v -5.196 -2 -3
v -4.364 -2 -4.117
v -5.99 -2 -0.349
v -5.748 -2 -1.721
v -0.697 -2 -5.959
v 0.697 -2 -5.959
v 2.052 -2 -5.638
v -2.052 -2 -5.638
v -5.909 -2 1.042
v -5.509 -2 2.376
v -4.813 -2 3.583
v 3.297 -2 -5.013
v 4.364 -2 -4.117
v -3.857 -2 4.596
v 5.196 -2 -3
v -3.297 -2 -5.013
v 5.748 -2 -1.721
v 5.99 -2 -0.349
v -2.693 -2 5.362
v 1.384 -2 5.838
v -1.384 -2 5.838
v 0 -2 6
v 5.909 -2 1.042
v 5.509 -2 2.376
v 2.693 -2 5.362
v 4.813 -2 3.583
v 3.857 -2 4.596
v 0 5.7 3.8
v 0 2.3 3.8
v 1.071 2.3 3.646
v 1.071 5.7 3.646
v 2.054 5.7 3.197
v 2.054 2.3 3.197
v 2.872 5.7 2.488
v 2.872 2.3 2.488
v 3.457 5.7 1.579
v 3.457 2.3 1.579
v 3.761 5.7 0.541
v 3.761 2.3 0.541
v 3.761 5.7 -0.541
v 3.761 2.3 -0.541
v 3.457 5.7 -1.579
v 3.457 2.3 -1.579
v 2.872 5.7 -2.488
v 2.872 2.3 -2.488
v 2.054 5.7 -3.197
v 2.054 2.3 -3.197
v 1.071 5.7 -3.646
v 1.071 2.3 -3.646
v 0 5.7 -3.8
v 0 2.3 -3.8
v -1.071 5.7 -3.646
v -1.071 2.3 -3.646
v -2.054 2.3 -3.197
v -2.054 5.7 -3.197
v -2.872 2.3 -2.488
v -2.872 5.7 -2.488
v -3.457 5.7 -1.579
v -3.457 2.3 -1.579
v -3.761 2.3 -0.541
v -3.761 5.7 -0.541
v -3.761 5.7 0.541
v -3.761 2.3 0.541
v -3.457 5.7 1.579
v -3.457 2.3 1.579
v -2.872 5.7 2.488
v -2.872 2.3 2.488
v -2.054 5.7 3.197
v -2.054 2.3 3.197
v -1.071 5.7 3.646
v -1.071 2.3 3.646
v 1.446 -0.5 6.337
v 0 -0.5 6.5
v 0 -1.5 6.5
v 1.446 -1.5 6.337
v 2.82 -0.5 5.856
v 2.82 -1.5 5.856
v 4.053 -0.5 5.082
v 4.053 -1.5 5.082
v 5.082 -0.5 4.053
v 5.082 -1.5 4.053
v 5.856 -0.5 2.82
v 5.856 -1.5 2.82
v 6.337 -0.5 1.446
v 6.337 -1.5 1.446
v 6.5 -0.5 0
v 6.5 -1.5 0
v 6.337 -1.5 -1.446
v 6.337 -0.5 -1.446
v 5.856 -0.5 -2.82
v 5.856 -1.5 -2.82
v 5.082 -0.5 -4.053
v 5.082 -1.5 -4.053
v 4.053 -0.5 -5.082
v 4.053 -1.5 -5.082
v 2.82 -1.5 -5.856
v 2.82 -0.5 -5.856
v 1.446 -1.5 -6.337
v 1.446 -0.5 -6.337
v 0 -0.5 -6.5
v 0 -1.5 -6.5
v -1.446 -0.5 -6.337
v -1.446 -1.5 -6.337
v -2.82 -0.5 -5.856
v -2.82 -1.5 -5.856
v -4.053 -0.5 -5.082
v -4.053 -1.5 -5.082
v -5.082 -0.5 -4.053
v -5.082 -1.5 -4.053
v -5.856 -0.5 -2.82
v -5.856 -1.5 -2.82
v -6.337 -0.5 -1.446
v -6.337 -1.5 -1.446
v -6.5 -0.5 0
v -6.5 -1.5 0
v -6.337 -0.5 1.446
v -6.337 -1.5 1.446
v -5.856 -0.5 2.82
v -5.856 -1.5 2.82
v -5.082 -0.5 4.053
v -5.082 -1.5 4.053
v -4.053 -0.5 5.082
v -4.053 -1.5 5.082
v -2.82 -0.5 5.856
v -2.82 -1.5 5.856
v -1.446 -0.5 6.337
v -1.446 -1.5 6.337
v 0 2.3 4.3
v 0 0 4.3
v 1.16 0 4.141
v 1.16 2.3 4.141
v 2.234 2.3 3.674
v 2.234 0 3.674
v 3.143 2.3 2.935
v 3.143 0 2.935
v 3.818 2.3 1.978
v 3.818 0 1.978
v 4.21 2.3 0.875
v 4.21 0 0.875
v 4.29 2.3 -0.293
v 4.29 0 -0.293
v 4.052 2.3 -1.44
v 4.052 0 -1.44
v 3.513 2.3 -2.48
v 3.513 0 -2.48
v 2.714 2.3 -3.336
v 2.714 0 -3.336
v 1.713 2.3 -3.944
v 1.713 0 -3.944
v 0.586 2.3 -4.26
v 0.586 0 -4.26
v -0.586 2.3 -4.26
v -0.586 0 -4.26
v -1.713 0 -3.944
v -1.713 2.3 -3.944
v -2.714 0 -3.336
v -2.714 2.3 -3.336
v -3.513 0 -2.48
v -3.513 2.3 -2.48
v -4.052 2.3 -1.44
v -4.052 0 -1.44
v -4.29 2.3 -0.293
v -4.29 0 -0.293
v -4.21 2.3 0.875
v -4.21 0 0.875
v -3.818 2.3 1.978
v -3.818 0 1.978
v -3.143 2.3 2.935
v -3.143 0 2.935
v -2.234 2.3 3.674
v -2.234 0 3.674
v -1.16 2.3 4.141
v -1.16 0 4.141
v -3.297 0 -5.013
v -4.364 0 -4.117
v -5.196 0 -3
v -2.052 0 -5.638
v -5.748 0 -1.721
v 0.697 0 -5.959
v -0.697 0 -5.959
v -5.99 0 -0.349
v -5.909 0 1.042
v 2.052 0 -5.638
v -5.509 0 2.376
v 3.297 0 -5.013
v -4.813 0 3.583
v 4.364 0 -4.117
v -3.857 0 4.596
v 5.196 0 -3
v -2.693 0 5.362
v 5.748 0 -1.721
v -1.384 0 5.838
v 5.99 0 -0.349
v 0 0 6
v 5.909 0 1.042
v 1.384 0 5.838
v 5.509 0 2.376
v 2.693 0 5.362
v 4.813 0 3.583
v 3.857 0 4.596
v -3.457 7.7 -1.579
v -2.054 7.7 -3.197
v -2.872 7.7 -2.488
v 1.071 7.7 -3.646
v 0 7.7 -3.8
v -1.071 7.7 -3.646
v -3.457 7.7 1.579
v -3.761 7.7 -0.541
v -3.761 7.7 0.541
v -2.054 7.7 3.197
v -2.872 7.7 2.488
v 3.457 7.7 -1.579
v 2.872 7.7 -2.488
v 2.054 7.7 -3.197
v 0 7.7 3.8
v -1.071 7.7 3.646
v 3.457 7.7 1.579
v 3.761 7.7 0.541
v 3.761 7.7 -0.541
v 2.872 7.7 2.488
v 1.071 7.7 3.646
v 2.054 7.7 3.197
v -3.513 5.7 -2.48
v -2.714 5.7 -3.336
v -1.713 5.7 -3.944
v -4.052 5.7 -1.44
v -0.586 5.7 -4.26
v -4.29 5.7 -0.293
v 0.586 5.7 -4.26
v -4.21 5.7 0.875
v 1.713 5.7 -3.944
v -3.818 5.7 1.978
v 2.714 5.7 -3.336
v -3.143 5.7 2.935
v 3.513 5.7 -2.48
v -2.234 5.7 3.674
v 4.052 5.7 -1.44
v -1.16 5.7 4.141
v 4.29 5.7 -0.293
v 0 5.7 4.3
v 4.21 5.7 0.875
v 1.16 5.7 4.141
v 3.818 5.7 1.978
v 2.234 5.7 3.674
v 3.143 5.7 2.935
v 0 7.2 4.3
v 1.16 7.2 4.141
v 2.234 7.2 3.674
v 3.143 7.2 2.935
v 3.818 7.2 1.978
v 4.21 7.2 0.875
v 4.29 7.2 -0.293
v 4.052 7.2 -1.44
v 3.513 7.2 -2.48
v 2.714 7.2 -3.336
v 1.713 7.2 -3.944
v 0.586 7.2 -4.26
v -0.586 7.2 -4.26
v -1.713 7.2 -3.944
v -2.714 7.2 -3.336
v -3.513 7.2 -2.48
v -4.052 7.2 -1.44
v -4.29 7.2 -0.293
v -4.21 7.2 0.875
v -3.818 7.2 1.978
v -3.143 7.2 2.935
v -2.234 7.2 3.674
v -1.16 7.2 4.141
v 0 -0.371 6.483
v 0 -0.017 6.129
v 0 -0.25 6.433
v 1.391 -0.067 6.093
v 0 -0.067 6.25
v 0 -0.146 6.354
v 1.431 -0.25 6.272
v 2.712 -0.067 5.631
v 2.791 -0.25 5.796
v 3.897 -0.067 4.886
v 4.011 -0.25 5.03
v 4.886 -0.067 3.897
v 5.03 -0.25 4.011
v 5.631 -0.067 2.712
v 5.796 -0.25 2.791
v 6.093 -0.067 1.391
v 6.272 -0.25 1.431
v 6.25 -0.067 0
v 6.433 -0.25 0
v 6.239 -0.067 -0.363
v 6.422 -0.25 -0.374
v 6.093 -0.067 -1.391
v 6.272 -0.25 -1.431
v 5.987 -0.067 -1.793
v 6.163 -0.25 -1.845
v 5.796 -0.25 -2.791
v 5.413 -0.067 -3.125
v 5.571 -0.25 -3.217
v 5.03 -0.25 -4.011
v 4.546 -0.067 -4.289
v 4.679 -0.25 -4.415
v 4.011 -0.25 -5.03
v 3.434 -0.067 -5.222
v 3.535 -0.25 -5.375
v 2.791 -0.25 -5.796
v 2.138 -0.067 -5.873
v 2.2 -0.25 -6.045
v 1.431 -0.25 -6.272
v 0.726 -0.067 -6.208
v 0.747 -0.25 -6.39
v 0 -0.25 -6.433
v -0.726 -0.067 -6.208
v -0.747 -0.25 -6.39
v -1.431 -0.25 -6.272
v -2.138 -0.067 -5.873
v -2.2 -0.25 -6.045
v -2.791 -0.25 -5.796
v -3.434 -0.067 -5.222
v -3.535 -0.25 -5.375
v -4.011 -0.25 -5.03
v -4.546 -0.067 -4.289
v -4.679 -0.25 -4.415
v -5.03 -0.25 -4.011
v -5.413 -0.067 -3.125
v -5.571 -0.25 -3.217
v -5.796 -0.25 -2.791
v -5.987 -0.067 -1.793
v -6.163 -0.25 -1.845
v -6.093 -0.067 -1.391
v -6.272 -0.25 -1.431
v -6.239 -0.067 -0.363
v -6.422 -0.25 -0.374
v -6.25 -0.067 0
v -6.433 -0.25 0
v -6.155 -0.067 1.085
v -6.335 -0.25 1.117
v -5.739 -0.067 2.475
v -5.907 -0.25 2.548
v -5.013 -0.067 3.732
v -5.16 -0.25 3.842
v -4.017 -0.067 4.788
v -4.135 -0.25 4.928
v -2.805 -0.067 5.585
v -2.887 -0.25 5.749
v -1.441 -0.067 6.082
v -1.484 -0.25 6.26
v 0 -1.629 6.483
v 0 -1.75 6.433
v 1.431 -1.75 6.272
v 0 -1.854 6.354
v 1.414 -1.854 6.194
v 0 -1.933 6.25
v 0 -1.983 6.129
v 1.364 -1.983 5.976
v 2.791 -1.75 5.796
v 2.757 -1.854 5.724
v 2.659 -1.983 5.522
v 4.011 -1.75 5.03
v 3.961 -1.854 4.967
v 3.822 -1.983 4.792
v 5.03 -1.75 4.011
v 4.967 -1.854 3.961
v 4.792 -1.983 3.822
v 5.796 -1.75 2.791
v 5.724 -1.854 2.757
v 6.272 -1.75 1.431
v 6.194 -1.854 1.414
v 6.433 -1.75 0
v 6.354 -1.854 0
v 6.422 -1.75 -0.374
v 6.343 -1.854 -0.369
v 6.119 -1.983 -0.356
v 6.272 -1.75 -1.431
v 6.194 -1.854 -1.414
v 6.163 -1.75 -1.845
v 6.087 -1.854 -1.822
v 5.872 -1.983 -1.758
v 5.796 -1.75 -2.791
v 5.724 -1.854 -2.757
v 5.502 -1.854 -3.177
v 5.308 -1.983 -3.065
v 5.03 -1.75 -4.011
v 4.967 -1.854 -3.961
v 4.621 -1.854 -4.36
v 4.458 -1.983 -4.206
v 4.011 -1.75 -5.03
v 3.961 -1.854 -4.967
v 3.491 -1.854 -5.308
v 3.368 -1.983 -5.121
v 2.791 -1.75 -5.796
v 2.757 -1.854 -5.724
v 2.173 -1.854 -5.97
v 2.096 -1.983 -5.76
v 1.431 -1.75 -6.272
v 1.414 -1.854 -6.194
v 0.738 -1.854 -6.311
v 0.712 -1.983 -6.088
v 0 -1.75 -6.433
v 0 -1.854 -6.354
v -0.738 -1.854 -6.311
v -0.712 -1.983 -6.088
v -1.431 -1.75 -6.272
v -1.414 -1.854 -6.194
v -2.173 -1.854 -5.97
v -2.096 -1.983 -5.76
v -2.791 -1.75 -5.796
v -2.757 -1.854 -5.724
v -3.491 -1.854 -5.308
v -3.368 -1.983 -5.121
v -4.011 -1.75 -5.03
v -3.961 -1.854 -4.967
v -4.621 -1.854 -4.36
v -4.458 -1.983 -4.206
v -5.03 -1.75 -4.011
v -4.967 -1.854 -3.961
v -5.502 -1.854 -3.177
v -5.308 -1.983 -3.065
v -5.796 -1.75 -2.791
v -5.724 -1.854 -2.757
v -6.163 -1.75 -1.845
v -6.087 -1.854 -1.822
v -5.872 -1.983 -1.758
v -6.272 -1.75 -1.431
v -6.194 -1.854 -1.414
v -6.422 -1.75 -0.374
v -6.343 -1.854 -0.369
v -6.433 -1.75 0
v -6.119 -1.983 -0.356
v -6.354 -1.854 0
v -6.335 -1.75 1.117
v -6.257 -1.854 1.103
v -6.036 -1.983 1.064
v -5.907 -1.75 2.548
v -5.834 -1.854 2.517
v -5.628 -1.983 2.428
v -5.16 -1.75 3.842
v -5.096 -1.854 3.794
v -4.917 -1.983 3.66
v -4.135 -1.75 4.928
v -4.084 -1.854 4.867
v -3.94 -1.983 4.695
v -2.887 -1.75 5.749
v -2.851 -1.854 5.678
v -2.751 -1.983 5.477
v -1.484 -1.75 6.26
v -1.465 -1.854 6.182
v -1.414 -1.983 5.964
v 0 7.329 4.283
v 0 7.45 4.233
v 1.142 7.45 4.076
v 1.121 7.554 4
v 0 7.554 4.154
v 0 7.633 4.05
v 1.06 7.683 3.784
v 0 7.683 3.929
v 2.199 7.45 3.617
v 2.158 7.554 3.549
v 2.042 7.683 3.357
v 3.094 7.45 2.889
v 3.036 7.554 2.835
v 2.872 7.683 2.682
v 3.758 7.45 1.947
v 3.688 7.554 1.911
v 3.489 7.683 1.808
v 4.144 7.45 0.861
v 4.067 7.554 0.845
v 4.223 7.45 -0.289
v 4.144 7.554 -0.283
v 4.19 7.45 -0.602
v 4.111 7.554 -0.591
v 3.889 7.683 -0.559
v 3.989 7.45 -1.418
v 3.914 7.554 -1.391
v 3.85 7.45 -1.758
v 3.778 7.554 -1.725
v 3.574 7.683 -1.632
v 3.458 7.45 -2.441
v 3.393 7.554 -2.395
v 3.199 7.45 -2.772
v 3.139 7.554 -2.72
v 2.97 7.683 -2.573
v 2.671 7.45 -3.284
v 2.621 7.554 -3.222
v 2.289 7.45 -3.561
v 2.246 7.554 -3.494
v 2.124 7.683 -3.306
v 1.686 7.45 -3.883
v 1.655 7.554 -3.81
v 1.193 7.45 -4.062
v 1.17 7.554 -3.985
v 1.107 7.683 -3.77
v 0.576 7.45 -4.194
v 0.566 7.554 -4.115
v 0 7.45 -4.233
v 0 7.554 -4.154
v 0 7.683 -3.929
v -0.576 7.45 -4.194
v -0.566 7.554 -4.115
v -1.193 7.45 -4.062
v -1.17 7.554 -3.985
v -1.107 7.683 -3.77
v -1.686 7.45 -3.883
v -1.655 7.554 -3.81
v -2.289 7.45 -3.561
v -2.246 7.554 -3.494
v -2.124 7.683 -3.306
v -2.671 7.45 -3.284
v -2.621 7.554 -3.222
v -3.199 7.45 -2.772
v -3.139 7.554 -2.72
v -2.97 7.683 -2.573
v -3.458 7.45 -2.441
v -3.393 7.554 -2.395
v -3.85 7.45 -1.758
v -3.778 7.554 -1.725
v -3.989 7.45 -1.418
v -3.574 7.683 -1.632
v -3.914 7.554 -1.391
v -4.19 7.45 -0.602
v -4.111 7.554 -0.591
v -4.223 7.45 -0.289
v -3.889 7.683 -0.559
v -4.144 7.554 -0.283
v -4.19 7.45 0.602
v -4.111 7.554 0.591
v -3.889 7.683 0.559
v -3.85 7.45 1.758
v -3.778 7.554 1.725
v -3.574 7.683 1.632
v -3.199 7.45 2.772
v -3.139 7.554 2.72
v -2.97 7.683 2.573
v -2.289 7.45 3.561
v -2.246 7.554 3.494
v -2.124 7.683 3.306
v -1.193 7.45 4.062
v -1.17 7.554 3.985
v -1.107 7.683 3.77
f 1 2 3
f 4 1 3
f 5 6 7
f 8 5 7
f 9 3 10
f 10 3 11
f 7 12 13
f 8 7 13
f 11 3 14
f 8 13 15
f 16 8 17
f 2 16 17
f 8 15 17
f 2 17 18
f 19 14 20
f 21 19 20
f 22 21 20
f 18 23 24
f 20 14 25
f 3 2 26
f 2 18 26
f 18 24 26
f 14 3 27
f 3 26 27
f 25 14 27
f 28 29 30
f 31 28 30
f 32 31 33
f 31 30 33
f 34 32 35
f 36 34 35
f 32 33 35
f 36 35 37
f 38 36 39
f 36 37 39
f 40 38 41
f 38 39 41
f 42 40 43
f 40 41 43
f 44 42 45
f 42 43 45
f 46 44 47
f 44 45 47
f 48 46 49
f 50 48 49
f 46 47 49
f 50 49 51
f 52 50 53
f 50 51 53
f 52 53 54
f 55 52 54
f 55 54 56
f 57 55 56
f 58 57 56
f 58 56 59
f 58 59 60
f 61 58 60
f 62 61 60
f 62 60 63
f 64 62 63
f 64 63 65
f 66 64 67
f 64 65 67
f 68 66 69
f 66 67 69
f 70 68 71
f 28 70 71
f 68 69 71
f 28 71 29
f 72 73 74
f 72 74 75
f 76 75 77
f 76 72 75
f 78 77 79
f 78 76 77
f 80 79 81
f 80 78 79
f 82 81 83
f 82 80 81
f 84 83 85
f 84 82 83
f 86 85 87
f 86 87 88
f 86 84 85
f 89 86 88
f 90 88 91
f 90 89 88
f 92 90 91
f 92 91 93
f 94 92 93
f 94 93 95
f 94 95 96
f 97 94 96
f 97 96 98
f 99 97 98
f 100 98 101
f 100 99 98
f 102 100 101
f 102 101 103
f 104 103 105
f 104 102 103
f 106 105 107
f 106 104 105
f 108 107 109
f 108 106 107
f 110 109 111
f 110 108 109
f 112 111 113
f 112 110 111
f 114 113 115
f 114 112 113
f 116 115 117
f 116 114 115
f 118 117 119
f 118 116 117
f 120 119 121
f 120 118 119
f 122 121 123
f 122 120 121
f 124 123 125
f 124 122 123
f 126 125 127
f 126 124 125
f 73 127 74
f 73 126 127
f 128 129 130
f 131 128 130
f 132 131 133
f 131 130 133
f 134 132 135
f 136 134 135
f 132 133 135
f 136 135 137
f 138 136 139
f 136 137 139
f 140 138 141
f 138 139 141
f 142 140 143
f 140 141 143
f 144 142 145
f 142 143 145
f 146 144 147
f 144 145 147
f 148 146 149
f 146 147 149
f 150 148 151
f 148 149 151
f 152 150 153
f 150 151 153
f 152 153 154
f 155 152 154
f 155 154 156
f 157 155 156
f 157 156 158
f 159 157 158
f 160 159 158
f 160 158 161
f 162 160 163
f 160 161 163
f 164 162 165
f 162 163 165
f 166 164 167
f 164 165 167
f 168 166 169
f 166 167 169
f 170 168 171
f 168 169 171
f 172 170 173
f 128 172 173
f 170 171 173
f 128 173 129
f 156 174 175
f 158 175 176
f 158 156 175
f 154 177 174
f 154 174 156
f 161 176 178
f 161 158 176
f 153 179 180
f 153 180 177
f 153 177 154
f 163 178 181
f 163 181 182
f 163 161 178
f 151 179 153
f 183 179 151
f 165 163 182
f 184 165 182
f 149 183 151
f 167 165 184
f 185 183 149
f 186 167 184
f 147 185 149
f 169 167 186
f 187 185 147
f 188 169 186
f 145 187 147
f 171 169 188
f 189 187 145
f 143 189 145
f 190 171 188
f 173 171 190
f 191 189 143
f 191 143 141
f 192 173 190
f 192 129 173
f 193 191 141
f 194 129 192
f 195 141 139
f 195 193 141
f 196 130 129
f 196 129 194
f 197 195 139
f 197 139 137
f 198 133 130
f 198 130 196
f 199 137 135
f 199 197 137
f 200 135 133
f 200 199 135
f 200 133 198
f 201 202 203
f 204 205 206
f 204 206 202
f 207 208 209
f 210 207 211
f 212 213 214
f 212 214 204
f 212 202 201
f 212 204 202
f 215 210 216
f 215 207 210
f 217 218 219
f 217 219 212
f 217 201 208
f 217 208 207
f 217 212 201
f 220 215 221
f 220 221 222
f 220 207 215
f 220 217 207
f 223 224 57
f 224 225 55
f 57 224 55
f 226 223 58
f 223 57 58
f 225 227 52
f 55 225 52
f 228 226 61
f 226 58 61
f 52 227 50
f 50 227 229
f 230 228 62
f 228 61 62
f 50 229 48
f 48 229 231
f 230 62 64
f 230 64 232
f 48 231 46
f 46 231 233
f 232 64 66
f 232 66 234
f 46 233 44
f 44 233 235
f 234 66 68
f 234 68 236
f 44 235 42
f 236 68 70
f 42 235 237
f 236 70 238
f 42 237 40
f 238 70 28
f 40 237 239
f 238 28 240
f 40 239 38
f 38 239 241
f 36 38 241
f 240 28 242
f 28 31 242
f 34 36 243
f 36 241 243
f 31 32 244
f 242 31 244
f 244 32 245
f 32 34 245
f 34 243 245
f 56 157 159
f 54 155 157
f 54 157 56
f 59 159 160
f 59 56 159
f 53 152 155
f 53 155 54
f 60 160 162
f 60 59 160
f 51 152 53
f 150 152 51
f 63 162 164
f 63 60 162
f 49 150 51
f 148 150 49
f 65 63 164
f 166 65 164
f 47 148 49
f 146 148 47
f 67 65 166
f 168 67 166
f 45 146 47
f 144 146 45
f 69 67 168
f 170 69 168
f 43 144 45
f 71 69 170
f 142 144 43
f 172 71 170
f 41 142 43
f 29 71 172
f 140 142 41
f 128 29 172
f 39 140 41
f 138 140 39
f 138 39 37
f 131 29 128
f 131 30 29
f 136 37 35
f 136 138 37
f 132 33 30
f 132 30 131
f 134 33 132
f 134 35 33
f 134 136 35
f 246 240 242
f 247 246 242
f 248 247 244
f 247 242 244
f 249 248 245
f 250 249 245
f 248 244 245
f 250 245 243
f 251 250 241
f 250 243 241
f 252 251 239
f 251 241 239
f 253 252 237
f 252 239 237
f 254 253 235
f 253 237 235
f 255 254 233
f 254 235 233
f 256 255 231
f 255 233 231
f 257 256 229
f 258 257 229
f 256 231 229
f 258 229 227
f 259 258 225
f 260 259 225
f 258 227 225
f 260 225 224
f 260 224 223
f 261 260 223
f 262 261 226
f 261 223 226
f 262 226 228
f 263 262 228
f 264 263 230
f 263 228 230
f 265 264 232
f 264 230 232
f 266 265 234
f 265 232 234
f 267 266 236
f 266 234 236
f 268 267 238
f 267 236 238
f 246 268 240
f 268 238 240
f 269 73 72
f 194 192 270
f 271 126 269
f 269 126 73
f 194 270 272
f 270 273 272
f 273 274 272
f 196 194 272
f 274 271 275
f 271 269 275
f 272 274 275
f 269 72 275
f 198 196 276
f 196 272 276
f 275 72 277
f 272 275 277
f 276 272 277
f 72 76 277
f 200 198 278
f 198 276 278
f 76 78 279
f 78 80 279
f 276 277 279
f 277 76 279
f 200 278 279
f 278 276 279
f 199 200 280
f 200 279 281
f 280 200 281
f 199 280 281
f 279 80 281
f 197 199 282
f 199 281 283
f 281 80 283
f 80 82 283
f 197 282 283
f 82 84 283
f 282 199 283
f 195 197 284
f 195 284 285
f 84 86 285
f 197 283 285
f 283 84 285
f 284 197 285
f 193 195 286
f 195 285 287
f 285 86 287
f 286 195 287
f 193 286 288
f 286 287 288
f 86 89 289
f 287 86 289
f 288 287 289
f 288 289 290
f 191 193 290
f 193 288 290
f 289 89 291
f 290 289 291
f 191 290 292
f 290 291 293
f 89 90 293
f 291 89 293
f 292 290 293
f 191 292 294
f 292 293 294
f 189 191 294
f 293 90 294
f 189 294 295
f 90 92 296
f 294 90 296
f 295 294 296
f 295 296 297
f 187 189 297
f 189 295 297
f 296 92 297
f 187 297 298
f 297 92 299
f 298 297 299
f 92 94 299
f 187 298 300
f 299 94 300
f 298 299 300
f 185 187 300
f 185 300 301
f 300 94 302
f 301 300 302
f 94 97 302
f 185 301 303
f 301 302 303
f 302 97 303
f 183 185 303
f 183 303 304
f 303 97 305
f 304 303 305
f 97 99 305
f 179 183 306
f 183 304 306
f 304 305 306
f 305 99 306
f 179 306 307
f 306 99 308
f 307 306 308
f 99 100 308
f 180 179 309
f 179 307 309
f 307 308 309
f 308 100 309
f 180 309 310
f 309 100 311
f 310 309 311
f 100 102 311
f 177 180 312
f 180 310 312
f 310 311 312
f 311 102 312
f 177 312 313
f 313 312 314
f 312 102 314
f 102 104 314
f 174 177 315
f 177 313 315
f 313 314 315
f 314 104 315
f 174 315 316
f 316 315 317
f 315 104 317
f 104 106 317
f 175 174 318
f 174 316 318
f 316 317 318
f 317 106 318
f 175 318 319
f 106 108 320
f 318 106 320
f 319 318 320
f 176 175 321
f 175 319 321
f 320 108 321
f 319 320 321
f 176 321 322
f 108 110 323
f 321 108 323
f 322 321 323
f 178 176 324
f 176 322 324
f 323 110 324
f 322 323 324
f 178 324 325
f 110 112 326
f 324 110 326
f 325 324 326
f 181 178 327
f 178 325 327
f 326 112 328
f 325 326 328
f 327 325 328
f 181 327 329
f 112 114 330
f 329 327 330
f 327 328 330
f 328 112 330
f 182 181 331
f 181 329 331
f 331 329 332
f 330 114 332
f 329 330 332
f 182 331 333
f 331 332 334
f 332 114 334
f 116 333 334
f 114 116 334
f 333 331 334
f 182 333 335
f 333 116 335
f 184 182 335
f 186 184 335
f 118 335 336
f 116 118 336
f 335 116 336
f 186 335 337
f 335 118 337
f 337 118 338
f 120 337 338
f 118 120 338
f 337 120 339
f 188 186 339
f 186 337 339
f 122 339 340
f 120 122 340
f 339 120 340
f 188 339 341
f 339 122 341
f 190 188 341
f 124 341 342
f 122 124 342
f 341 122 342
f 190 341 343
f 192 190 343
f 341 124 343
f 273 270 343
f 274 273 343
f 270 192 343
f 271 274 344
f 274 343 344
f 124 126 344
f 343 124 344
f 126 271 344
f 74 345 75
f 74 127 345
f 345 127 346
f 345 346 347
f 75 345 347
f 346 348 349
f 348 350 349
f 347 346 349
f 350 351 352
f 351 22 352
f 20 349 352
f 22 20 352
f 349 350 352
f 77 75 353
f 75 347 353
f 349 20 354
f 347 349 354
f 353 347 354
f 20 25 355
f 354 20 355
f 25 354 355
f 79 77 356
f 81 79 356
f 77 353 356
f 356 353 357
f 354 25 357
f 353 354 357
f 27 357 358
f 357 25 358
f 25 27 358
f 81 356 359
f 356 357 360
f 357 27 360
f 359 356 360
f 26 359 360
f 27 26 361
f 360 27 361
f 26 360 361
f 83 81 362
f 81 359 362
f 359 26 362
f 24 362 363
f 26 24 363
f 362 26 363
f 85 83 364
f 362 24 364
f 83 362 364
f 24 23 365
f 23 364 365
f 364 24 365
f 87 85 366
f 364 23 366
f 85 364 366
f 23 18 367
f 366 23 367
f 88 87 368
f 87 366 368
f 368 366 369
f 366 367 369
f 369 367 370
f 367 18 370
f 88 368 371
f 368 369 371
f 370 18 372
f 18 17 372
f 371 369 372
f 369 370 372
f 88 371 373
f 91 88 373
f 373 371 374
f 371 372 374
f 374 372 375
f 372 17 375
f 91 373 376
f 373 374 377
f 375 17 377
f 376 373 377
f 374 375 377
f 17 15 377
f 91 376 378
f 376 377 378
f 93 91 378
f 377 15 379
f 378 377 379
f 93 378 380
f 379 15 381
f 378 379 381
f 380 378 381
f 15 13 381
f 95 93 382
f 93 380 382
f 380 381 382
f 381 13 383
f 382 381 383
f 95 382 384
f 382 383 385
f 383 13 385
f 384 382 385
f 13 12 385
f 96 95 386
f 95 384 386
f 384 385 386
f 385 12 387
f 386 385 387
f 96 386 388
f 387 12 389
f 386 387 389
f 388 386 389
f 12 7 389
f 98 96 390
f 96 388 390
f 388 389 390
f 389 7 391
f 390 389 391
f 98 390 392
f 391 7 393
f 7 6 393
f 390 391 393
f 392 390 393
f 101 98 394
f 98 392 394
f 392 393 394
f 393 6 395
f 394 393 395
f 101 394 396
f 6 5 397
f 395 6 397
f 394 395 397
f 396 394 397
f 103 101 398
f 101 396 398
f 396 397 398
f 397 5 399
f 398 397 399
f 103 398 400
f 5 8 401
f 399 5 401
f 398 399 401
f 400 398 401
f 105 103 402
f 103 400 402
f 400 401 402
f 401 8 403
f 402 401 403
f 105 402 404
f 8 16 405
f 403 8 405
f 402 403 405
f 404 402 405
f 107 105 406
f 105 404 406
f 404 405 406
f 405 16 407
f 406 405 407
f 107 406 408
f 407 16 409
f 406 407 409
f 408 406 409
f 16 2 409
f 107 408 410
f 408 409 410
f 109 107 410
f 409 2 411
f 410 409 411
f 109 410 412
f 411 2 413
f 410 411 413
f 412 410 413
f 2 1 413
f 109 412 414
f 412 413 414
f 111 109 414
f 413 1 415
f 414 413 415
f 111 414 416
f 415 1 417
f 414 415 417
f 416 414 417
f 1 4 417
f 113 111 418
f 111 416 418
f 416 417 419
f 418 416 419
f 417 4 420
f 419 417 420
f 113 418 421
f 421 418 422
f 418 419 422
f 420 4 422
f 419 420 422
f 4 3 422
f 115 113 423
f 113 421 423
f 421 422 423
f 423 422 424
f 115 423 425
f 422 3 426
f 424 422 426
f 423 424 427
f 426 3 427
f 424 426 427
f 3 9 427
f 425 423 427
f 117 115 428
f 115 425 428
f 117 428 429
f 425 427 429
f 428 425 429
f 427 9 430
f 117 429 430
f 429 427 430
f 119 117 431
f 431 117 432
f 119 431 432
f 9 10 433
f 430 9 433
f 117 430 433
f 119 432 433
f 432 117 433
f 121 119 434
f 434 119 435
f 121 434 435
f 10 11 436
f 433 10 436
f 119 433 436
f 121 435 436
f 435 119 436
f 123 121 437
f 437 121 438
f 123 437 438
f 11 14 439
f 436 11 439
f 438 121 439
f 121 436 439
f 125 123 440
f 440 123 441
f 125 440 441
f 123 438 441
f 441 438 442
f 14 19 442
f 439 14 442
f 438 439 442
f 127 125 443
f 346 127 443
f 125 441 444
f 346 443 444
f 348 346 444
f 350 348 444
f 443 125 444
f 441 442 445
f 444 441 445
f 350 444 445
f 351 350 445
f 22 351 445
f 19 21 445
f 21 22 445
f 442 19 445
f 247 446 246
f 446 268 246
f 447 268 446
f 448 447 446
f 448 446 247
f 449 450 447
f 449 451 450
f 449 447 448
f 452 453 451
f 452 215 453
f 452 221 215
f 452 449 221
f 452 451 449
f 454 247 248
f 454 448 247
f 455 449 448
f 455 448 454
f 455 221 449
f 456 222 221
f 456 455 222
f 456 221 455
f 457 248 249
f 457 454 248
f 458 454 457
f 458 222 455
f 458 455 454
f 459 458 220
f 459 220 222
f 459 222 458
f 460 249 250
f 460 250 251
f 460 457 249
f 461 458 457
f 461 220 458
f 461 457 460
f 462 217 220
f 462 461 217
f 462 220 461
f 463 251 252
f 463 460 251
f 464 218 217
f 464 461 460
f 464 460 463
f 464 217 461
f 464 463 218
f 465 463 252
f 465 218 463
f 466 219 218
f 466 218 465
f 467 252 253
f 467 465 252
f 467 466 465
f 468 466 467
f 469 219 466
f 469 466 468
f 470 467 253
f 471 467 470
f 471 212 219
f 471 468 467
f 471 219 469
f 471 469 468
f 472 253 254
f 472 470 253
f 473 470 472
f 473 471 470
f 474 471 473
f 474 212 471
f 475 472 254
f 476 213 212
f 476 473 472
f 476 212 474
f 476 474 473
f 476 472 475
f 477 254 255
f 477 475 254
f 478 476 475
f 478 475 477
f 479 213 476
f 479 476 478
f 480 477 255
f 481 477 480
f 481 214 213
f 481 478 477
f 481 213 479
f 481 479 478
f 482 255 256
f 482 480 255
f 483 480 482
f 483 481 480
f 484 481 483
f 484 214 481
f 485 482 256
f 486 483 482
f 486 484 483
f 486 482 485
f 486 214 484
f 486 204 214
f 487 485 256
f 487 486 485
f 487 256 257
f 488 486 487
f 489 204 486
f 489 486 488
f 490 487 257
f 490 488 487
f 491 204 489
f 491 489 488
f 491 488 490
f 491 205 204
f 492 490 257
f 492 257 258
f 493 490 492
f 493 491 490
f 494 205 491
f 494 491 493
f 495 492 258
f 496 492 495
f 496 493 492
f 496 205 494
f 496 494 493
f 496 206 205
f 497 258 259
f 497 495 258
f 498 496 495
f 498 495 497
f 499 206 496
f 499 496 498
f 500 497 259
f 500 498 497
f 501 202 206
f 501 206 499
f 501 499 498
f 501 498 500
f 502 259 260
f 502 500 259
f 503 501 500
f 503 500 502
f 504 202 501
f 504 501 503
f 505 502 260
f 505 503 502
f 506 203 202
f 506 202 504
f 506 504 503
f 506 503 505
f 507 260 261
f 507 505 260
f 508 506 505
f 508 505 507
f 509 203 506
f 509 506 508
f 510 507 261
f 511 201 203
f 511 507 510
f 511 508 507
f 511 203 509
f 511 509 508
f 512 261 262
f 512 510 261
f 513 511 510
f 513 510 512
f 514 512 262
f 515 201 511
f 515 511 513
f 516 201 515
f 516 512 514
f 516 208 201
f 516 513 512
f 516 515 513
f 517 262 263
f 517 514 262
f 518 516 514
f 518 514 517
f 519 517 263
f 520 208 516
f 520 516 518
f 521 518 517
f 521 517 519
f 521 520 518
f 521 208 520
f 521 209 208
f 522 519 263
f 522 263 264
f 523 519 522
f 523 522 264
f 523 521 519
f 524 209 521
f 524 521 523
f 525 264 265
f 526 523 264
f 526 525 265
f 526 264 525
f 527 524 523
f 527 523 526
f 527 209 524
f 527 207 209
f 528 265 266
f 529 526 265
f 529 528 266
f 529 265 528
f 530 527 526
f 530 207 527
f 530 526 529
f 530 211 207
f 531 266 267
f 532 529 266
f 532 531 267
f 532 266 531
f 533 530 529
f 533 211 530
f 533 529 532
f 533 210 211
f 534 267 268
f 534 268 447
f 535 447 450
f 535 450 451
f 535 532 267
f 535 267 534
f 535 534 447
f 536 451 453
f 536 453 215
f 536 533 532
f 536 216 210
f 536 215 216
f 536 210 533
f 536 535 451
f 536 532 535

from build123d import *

# Parameters (mm, degrees)
ESBO_O1_R                = 6.5
RESSALTO_EXTRUS_O1_DEPTH = 2
ESBO_O2_R                = 4.3
RESSALTO_EXTRUS_O2_DEPTH = 2.3
ESBO_O3_R                = 3.8
RESSALTO_EXTRUS_O3_DEPTH = 3.4
ESBO_O4_R                = 4.3
RESSALTO_EXTRUS_O4_DEPTH = 2
FILETE1_R                = 0.5


with BuildPart() as part:
    # Esboço1 → Ressalto-extrusão1 (new body)
    with BuildSketch(Plane(origin=(0, 0, 0), x_dir=(1, 0, 0), z_dir=(0, 1, 0))):
        with Locations(Location((0, 0, 0), (0, 0, 270))):
            Circle(ESBO_O1_R)
    extrude(amount=-RESSALTO_EXTRUS_O1_DEPTH)

    # Esboço2 → Ressalto-extrusão2 (add)
    with BuildSketch(Plane(origin=(0, 0, 0), x_dir=(1, 0, 0), z_dir=(0, 1, 0))):
        with Locations(Location((0, 0, 0), (0, 0, 270))):
            Circle(ESBO_O2_R)
    extrude(amount=RESSALTO_EXTRUS_O2_DEPTH)

    # Esboço3 → Ressalto-extrusão3 (add)
    with BuildSketch(Plane(origin=(0, 2.3, 0), x_dir=(1, 0, 0), z_dir=(0, 1, 0))):
        with Locations(Location((0, 0, 0), (0, 0, 270))):
            Circle(ESBO_O3_R)
    extrude(amount=RESSALTO_EXTRUS_O3_DEPTH)

    # Esboço4 → Ressalto-extrusão4 (add)
    with BuildSketch(Plane(origin=(0, 5.7, 0), x_dir=(1, 0, 0), z_dir=(0, 1, 0))):
        with Locations(Location((0, 0, 0), (0, 0, 270))):
            Circle(ESBO_O4_R)
    extrude(amount=RESSALTO_EXTRUS_O4_DEPTH)

    # Filete1
    filete1_edges = [part.edges().sort_by_distance(p)[0] for p in [
        (0, 7.7, -4.3),
        (0, 0, -6.5),
        (0, -2, -6.5),
    ]]
    fillet(filete1_edges, radius=FILETE1_R)


solid = part.part
